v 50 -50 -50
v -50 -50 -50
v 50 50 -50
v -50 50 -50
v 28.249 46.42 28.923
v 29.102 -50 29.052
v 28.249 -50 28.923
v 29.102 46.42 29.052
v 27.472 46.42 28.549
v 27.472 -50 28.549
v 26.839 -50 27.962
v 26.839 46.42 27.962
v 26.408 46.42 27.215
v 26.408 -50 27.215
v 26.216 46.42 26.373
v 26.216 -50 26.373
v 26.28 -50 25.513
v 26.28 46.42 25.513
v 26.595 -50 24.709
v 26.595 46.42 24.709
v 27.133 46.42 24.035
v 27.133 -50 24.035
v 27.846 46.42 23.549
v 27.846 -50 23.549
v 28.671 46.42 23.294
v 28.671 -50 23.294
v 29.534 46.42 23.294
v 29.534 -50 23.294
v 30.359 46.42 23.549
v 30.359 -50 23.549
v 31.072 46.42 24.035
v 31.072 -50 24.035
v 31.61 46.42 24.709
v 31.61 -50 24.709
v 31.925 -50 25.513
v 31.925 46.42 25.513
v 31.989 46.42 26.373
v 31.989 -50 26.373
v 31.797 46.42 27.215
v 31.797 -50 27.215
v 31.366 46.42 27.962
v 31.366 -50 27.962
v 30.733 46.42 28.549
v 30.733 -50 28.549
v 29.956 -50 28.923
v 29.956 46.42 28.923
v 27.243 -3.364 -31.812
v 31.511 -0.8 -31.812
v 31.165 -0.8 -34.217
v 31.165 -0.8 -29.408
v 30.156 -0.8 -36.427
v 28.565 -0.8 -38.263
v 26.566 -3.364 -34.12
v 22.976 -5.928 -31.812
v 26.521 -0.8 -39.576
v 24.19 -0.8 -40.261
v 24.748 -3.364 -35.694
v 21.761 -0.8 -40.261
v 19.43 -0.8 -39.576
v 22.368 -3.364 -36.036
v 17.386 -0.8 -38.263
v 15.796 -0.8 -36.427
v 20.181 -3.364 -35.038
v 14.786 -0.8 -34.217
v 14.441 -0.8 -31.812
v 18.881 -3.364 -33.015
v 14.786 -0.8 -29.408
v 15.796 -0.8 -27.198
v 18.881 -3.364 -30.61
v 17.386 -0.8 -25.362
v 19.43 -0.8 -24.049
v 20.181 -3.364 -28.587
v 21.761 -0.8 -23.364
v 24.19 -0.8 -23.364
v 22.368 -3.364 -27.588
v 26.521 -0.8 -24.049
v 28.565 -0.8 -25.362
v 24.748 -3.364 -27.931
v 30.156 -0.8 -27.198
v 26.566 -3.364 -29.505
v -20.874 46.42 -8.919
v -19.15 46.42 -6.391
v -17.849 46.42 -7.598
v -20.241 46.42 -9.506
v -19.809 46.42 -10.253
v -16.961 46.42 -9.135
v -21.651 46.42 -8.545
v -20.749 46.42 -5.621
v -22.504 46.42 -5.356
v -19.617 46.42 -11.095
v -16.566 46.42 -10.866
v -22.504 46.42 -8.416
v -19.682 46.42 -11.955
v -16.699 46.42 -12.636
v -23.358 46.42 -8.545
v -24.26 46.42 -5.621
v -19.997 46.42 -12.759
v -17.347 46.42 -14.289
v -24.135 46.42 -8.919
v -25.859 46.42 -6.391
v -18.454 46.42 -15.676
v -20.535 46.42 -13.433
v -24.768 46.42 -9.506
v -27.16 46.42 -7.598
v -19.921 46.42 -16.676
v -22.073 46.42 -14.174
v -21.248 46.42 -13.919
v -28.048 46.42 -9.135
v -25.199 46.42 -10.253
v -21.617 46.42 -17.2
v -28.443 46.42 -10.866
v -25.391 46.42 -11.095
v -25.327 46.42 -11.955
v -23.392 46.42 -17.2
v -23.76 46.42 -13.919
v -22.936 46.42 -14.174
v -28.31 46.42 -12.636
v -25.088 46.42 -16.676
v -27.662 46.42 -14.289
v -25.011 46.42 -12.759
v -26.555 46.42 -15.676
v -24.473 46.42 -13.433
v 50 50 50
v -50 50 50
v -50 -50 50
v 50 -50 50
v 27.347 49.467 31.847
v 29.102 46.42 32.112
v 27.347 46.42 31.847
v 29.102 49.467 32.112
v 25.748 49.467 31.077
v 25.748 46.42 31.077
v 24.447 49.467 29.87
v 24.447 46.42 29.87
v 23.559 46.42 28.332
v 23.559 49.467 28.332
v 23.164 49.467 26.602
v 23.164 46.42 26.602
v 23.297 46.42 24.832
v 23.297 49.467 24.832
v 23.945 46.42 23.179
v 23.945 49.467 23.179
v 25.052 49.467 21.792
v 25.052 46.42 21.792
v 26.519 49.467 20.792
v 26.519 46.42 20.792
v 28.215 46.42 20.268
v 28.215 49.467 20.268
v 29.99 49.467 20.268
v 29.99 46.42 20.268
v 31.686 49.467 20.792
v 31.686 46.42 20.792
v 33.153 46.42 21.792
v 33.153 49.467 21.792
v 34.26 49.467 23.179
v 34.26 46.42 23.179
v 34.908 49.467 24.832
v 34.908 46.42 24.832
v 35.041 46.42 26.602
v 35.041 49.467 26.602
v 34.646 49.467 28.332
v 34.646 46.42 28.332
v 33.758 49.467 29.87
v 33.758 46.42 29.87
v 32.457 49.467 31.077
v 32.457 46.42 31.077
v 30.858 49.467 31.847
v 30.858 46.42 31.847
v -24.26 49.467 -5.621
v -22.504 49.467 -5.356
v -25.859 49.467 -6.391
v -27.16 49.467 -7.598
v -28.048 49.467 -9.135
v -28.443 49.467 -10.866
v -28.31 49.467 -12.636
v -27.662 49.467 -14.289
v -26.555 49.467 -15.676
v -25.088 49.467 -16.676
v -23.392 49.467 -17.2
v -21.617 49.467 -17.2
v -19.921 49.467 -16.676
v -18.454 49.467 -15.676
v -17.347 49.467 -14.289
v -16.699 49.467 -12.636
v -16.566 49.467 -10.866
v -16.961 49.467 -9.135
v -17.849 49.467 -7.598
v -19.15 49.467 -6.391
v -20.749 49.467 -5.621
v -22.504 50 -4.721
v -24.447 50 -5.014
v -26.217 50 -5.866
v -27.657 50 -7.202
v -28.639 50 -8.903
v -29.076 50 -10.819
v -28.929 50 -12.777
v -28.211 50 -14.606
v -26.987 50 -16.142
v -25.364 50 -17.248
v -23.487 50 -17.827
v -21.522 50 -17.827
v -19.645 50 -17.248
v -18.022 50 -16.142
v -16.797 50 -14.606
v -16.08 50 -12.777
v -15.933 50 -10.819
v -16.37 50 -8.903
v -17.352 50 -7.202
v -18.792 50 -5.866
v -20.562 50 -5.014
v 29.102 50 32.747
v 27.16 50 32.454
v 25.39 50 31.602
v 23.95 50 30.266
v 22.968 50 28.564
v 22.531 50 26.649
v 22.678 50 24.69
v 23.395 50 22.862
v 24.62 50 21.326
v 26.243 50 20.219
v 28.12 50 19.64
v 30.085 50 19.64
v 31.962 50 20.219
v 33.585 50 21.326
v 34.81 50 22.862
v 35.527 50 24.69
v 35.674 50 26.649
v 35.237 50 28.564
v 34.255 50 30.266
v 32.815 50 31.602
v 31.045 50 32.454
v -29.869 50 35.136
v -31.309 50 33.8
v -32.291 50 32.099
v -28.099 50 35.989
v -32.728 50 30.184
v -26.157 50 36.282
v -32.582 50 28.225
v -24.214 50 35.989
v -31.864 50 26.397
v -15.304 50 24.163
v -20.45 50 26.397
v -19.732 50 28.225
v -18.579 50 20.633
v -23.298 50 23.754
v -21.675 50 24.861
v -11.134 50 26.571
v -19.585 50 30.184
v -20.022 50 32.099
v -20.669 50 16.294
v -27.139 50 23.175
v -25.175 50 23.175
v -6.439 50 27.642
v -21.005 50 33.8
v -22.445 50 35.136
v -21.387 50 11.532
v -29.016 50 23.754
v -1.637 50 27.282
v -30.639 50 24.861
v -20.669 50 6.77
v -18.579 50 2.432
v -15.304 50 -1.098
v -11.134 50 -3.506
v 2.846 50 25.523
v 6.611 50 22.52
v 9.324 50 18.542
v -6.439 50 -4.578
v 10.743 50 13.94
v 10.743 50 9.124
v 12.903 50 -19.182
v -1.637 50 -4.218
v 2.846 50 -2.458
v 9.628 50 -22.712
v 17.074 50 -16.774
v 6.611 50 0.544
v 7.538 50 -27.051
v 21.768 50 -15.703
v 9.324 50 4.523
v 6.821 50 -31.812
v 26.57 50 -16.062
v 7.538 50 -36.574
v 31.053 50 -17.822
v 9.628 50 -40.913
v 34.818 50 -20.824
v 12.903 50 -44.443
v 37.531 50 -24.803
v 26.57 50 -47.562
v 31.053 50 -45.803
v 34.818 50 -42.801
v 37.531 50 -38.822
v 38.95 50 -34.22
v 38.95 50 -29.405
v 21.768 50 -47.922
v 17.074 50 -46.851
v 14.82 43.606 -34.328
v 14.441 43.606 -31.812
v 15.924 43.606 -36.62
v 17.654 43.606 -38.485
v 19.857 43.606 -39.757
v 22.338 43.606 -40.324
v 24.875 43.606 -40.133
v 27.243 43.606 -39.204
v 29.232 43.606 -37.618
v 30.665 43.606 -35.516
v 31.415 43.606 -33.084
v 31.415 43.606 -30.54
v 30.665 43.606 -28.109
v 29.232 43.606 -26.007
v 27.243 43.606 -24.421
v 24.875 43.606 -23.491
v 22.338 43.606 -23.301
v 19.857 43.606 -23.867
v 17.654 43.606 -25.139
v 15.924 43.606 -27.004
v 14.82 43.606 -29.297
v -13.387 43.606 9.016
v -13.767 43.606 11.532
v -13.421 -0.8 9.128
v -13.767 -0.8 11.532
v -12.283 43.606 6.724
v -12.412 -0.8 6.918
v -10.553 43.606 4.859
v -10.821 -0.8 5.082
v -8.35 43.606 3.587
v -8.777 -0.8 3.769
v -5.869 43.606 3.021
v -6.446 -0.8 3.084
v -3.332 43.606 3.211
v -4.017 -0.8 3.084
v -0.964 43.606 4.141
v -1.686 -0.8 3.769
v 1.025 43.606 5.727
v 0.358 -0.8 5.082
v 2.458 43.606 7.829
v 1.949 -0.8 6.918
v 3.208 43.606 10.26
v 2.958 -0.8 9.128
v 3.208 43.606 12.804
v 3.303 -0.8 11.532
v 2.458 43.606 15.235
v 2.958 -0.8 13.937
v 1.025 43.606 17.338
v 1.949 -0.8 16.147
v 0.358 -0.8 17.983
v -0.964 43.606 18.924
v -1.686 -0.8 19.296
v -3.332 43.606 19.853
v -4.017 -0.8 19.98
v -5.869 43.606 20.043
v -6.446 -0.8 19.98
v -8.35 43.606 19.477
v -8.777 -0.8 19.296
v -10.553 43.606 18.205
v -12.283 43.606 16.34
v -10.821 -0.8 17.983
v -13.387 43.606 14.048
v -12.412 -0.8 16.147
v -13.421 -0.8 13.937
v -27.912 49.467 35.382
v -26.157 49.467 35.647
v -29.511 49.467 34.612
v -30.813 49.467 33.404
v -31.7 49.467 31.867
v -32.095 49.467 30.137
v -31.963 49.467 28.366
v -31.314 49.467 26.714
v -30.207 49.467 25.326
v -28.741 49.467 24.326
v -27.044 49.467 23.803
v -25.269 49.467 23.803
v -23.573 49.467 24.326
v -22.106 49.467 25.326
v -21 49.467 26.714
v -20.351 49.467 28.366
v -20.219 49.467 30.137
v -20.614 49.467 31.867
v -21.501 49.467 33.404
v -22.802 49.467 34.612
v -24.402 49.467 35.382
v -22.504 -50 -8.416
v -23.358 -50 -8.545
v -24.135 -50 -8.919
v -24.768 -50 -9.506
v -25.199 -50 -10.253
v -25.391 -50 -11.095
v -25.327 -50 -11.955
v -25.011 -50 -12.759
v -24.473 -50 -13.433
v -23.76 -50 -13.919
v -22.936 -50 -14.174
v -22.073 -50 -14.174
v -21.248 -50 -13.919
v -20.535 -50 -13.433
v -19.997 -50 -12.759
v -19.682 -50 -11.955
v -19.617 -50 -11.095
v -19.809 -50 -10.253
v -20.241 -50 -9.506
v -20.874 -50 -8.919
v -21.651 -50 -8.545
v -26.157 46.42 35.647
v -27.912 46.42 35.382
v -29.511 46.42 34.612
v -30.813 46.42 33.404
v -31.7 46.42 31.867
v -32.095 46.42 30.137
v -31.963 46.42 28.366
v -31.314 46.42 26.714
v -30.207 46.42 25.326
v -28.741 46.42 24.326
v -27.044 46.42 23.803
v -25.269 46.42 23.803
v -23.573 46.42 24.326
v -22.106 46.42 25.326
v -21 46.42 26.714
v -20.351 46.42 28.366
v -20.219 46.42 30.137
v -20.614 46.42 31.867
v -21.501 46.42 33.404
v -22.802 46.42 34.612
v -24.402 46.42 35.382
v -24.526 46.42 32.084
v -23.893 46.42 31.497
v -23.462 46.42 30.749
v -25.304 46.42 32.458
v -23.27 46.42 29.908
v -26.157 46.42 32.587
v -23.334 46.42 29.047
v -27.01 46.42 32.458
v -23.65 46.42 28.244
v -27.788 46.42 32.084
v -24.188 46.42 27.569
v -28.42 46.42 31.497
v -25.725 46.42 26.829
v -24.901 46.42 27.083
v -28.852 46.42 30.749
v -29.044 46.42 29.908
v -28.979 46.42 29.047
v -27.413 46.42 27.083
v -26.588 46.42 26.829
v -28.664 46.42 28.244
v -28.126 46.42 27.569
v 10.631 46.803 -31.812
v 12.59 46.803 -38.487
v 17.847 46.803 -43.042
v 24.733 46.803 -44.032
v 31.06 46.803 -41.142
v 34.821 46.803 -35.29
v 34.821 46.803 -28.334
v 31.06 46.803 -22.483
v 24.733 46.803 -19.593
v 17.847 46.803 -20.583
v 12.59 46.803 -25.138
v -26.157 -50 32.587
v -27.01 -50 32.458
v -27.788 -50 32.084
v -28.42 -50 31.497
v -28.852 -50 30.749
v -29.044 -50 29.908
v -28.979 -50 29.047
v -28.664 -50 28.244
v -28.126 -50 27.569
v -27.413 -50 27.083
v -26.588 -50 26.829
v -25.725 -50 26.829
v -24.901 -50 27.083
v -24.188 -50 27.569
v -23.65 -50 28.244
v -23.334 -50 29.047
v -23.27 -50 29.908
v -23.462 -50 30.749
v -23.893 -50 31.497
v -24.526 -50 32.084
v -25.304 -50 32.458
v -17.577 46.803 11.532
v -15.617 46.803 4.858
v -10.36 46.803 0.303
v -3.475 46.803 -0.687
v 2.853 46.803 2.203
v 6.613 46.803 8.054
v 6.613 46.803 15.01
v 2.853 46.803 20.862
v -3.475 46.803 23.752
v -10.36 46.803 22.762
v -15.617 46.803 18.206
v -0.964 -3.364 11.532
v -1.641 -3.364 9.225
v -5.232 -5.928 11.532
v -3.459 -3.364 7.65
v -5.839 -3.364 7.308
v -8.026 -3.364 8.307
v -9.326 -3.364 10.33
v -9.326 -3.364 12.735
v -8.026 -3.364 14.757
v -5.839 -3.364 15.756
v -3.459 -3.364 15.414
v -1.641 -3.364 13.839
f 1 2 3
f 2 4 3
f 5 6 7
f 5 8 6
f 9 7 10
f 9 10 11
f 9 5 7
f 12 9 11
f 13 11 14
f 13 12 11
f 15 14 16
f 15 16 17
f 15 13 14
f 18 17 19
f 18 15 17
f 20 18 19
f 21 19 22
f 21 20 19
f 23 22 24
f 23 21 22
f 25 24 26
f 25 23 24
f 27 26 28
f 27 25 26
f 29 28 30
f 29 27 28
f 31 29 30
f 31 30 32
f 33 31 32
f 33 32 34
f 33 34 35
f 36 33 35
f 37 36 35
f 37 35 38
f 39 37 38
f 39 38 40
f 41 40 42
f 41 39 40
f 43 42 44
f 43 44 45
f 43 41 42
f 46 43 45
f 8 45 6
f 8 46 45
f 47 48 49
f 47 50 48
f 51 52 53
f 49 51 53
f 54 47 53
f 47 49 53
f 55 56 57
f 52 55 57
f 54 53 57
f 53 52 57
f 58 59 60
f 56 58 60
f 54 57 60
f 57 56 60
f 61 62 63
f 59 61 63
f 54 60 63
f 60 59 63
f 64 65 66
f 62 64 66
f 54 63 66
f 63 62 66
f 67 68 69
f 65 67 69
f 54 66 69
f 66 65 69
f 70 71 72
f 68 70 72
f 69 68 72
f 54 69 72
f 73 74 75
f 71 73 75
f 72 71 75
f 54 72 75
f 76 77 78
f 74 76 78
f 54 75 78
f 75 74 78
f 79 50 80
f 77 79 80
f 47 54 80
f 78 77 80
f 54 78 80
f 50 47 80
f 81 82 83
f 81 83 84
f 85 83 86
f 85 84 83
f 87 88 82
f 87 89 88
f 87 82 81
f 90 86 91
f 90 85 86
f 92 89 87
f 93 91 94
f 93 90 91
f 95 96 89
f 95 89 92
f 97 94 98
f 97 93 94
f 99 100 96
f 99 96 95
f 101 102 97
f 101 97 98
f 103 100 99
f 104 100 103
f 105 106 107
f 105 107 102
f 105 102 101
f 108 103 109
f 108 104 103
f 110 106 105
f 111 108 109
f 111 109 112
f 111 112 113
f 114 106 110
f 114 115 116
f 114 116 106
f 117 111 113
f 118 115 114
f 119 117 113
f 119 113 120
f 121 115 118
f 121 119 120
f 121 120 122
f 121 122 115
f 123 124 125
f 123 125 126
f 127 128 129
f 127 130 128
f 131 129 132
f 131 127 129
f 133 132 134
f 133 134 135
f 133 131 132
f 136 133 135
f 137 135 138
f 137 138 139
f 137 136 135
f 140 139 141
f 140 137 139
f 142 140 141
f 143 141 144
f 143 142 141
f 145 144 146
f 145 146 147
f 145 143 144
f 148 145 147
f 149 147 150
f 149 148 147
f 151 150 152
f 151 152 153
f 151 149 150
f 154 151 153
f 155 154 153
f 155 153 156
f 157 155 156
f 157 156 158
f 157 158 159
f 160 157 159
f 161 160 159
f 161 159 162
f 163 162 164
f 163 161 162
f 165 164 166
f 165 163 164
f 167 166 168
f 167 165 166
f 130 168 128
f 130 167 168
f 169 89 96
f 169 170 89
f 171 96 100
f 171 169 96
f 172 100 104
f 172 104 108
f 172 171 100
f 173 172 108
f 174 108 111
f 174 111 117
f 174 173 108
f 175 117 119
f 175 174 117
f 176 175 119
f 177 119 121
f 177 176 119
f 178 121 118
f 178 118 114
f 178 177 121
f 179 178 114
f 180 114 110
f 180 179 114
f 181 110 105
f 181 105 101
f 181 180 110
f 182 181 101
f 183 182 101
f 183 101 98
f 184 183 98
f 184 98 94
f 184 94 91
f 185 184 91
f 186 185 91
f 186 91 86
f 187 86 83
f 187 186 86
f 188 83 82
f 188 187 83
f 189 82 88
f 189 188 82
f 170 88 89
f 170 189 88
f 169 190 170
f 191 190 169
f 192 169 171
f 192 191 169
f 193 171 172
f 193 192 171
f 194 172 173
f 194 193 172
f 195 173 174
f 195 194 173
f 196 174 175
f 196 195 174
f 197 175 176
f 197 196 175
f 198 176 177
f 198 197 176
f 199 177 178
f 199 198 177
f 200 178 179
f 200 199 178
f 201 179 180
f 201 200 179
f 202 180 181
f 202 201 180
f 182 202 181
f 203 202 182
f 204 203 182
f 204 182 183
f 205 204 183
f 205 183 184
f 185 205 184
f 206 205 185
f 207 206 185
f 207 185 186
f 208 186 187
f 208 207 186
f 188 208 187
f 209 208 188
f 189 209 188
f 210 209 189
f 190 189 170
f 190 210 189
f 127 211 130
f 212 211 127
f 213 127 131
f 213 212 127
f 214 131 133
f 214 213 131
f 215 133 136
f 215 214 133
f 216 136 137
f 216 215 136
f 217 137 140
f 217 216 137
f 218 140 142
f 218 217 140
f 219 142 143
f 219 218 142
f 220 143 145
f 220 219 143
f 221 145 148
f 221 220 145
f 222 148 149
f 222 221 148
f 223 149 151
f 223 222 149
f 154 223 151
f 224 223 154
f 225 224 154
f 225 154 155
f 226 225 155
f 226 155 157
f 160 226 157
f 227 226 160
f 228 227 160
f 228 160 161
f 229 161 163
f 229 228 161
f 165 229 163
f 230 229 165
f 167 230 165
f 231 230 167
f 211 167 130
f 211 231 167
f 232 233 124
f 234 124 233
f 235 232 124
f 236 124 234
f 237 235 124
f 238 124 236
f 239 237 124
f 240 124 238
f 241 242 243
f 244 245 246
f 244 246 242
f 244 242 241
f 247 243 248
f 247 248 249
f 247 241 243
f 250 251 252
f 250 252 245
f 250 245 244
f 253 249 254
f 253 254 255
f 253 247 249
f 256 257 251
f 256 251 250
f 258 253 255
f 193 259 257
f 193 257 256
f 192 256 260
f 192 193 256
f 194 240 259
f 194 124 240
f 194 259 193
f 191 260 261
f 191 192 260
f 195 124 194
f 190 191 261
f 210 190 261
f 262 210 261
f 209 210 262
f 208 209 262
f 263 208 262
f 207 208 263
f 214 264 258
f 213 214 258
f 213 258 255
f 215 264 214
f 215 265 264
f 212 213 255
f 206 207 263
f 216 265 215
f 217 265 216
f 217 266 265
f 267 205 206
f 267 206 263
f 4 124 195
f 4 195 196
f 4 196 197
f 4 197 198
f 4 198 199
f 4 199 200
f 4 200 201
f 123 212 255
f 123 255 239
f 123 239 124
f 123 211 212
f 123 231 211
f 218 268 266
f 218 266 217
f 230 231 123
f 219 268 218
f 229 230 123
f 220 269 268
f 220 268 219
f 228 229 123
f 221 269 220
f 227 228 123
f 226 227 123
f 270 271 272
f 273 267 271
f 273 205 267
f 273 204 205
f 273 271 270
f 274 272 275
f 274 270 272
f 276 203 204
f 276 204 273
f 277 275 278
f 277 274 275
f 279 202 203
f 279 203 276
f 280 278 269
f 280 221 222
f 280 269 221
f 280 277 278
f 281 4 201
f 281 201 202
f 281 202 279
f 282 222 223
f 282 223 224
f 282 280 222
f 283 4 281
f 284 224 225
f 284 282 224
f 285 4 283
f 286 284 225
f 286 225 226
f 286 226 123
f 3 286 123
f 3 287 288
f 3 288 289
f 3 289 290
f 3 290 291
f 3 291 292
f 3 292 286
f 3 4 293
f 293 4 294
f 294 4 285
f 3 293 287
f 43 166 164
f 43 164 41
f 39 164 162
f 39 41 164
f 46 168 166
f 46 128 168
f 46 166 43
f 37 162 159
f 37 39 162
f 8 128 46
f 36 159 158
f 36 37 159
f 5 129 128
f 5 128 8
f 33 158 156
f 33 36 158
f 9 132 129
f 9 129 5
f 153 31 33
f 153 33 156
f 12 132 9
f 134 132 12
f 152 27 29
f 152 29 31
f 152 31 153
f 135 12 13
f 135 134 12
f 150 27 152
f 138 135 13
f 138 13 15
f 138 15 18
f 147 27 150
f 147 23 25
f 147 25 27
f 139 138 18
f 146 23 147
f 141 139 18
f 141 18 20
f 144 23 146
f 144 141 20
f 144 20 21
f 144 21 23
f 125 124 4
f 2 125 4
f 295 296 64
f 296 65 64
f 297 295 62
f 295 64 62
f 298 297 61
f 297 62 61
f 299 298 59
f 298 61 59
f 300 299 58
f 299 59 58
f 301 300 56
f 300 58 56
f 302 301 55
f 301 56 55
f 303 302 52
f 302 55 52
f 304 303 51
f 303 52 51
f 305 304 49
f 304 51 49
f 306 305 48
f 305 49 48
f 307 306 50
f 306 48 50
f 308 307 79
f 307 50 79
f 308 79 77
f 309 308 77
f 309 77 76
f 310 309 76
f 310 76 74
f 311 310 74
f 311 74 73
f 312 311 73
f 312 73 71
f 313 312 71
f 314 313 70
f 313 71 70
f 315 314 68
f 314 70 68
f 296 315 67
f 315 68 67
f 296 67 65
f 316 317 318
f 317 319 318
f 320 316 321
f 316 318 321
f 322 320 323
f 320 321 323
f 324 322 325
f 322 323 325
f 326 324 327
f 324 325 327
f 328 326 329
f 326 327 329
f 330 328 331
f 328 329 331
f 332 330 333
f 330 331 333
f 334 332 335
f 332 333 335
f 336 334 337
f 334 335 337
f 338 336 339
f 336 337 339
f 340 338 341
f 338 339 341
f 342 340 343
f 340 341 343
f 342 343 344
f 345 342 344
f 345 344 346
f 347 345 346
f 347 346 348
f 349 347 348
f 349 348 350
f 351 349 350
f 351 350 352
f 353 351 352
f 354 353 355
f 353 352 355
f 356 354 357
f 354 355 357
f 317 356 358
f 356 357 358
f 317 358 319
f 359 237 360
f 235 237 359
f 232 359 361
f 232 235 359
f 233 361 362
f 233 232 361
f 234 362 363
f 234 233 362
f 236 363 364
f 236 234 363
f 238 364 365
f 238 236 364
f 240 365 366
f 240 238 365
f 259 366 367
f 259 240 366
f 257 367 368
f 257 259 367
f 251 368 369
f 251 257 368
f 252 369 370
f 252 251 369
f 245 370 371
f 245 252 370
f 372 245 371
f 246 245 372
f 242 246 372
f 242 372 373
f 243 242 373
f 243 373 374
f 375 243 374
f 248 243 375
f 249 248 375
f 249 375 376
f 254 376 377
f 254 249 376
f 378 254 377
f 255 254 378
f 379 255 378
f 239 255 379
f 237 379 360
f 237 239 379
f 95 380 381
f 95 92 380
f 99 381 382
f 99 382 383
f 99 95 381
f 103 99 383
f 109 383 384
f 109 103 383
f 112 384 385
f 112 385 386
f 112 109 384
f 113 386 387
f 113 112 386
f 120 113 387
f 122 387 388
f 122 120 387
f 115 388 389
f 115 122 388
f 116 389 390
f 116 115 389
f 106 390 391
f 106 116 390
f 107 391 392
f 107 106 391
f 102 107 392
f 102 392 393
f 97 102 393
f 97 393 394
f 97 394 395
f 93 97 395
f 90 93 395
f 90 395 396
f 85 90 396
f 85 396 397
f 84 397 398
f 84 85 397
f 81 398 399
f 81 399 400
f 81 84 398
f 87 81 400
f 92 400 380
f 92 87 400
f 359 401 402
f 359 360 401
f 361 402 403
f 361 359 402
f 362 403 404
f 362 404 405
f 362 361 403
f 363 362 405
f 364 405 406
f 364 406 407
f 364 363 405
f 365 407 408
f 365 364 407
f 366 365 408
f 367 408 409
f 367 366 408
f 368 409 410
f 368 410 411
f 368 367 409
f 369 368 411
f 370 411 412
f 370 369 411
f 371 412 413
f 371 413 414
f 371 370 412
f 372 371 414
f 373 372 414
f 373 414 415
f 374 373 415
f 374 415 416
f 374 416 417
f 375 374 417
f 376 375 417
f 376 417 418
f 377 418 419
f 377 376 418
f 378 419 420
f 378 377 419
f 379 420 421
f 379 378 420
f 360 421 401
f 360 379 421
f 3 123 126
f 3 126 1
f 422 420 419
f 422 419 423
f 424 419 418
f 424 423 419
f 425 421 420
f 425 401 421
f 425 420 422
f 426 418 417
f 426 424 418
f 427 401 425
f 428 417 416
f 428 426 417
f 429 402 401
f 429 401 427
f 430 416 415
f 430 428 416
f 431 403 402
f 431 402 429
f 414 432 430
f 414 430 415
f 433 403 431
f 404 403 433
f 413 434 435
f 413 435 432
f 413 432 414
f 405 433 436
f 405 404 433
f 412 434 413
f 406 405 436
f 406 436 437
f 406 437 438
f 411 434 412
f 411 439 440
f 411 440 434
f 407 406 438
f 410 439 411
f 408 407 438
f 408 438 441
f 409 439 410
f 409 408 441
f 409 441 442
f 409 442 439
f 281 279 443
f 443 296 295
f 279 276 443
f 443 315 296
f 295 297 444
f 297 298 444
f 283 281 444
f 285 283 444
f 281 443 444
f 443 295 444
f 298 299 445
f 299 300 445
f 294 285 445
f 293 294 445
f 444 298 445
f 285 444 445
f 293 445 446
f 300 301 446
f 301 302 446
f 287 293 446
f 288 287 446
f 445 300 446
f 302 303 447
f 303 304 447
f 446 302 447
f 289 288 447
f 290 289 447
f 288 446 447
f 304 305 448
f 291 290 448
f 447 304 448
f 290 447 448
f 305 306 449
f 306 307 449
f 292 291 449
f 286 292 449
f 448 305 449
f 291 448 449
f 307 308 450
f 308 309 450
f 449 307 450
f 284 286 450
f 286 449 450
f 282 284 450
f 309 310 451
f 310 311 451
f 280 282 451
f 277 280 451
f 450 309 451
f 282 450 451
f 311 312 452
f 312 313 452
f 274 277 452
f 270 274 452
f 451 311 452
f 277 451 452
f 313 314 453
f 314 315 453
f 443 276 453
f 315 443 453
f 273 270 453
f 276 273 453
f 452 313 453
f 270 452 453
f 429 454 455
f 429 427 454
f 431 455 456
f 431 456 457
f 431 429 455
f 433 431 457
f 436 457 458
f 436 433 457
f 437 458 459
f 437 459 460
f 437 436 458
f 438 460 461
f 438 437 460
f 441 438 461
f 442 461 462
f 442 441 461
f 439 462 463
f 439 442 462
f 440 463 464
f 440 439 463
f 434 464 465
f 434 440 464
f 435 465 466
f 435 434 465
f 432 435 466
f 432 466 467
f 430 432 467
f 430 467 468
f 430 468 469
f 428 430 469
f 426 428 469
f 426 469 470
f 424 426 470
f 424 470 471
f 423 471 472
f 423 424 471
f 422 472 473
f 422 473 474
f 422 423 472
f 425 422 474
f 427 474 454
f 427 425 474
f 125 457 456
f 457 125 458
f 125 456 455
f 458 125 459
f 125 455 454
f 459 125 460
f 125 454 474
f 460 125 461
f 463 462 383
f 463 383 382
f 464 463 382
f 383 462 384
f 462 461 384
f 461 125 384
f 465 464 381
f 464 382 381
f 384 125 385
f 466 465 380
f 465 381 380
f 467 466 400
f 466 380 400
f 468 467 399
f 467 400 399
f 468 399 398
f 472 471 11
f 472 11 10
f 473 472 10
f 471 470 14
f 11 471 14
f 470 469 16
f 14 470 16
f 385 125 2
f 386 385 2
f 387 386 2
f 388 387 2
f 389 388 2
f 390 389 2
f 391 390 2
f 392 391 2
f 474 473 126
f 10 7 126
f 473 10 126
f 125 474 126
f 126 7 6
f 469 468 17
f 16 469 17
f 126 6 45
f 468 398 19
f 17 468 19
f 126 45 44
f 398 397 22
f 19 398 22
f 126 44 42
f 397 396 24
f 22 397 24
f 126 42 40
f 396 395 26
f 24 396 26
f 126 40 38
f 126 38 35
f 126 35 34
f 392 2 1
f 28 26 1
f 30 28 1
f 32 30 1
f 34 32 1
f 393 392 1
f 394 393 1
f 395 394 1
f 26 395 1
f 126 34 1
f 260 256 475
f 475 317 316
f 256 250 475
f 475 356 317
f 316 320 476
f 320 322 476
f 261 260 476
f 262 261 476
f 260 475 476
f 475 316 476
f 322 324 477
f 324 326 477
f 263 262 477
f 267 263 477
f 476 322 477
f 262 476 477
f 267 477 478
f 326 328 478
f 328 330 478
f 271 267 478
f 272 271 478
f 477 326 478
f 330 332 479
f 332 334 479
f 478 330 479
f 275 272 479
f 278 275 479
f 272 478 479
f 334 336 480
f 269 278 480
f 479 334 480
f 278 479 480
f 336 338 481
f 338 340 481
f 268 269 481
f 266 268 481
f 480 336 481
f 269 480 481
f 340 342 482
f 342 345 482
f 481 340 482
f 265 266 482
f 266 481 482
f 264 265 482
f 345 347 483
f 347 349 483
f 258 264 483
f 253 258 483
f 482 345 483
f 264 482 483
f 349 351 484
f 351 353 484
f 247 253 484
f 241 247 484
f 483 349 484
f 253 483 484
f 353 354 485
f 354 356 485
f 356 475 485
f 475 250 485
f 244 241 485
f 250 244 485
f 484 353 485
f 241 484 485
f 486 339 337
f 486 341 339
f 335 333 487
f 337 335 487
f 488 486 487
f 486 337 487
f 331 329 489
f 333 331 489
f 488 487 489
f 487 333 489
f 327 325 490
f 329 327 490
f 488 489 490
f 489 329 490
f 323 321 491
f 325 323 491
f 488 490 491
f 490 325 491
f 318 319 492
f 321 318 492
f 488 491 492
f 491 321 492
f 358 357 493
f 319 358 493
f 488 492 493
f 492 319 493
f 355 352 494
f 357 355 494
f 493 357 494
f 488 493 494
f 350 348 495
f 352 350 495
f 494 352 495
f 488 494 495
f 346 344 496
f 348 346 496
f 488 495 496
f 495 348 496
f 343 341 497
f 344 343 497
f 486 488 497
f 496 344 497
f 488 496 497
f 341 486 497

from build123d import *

# Parameters (mm, degrees)
SKETCH1_W                                       = 100
SKETCH1_H                                       = 100
BOSS_EXTRUDE1_DEPTH                             = 50
CSK_FOR_M2_FLAT_HEAD_MACHINE_SCREW1_D           = 17.07
CSK_FOR_M2_FLAT_HEAD_MACHINE_SCREW1_DEPTH       = 50.8
CSK_FOR_M2_FLAT_HEAD_MACHINE_SCREW1_CSINK_D     = 32.31
CSK_FOR_M2_FLAT_HEAD_MACHINE_SCREW1_CSINK_ANGLE = 100
CSK_FOR_M2_FLAT_HEAD_MACHINE_SCREW1_TIP         = 5.128345383
CBORE_FOR_M5_HEX_HEAD_BOLT1_AT_2_COUNT          = 2
CBORE_FOR_M5_HEX_HEAD_BOLT1_AT_2_PITCH          = 41.165028735
CBORE_FOR_M5_HEX_HEAD_BOLT1_AT_3_COUNT          = 2
CBORE_FOR_M5_HEX_HEAD_BOLT1_AT_3_PITCH          = 63.773894401


with BuildPart() as part:
    # Sketch1 → Boss-Extrude1 (new body, symmetric)
    with BuildSketch(Plane(origin=(0, 0, 0), x_dir=(1, 0, 0), z_dir=(0, 1, 0))):
        Rectangle(SKETCH1_W, SKETCH1_H)
    extrude(amount=BOSS_EXTRUDE1_DEPTH, both=True)

    # CSK for M2 Flat Head Machine Screw1
    with Locations(Plane(origin=(0, 50, 0), x_dir=(1, 0, 0), z_dir=(0, 1, 0))):
        with Locations((22.975631471, 31.812412806), (-5.231547771, -11.532234815)):
            CounterSinkHole(CSK_FOR_M2_FLAT_HEAD_MACHINE_SCREW1_D / 2, CSK_FOR_M2_FLAT_HEAD_MACHINE_SCREW1_CSINK_D / 2, depth=CSK_FOR_M2_FLAT_HEAD_MACHINE_SCREW1_DEPTH, counter_sink_angle=CSK_FOR_M2_FLAT_HEAD_MACHINE_SCREW1_CSINK_ANGLE)
            with Locations((0, 0, -(CSK_FOR_M2_FLAT_HEAD_MACHINE_SCREW1_DEPTH + CSK_FOR_M2_FLAT_HEAD_MACHINE_SCREW1_TIP / 2))):  # 118° drill point
                Cone(0, CSK_FOR_M2_FLAT_HEAD_MACHINE_SCREW1_D / 2, CSK_FOR_M2_FLAT_HEAD_MACHINE_SCREW1_TIP, mode=Mode.SUBTRACT)

    # Sketch10 → CBORE for M5 Hex Head Bolt1 (revolve, cut)
    with BuildSketch(Plane(origin=(-22.504336466, 50, -11.311080109), x_dir=(0, 0, 1), z_dir=(1, 0, 0))):
        Polygon((0, 0), (0, 100), (2.895, 100), (2.895, 3.58), (5.955, 3.58), (5.955, 0.532828266), (6.59, 0), align=None)
    cbore_for_m5_hex_head_bolt1 = revolve(axis=Axis((-22.504336466, 56.35, -11.311080109), (0, -1, 0)), mode=Mode.SUBTRACT)

    # CBORE for M5 Hex Head Bolt1 at 2: CBORE for M5 Hex Head Bolt1 ×2
    with Locations(*[Vector(-0.088729108, 0, 0.996055794) * (i * CBORE_FOR_M5_HEX_HEAD_BOLT1_AT_2_PITCH) for i in range(1, CBORE_FOR_M5_HEX_HEAD_BOLT1_AT_2_COUNT)]):
        add(cbore_for_m5_hex_head_bolt1, mode=Mode.SUBTRACT)

    # CBORE for M5 Hex Head Bolt1 at 3: CBORE for M5 Hex Head Bolt1 ×2
    with Locations(*[Vector(0.809215173, 0, 0.587512386) * (i * CBORE_FOR_M5_HEX_HEAD_BOLT1_AT_3_PITCH) for i in range(1, CBORE_FOR_M5_HEX_HEAD_BOLT1_AT_3_COUNT)]):
        add(cbore_for_m5_hex_head_bolt1, mode=Mode.SUBTRACT)


solid = part.part
